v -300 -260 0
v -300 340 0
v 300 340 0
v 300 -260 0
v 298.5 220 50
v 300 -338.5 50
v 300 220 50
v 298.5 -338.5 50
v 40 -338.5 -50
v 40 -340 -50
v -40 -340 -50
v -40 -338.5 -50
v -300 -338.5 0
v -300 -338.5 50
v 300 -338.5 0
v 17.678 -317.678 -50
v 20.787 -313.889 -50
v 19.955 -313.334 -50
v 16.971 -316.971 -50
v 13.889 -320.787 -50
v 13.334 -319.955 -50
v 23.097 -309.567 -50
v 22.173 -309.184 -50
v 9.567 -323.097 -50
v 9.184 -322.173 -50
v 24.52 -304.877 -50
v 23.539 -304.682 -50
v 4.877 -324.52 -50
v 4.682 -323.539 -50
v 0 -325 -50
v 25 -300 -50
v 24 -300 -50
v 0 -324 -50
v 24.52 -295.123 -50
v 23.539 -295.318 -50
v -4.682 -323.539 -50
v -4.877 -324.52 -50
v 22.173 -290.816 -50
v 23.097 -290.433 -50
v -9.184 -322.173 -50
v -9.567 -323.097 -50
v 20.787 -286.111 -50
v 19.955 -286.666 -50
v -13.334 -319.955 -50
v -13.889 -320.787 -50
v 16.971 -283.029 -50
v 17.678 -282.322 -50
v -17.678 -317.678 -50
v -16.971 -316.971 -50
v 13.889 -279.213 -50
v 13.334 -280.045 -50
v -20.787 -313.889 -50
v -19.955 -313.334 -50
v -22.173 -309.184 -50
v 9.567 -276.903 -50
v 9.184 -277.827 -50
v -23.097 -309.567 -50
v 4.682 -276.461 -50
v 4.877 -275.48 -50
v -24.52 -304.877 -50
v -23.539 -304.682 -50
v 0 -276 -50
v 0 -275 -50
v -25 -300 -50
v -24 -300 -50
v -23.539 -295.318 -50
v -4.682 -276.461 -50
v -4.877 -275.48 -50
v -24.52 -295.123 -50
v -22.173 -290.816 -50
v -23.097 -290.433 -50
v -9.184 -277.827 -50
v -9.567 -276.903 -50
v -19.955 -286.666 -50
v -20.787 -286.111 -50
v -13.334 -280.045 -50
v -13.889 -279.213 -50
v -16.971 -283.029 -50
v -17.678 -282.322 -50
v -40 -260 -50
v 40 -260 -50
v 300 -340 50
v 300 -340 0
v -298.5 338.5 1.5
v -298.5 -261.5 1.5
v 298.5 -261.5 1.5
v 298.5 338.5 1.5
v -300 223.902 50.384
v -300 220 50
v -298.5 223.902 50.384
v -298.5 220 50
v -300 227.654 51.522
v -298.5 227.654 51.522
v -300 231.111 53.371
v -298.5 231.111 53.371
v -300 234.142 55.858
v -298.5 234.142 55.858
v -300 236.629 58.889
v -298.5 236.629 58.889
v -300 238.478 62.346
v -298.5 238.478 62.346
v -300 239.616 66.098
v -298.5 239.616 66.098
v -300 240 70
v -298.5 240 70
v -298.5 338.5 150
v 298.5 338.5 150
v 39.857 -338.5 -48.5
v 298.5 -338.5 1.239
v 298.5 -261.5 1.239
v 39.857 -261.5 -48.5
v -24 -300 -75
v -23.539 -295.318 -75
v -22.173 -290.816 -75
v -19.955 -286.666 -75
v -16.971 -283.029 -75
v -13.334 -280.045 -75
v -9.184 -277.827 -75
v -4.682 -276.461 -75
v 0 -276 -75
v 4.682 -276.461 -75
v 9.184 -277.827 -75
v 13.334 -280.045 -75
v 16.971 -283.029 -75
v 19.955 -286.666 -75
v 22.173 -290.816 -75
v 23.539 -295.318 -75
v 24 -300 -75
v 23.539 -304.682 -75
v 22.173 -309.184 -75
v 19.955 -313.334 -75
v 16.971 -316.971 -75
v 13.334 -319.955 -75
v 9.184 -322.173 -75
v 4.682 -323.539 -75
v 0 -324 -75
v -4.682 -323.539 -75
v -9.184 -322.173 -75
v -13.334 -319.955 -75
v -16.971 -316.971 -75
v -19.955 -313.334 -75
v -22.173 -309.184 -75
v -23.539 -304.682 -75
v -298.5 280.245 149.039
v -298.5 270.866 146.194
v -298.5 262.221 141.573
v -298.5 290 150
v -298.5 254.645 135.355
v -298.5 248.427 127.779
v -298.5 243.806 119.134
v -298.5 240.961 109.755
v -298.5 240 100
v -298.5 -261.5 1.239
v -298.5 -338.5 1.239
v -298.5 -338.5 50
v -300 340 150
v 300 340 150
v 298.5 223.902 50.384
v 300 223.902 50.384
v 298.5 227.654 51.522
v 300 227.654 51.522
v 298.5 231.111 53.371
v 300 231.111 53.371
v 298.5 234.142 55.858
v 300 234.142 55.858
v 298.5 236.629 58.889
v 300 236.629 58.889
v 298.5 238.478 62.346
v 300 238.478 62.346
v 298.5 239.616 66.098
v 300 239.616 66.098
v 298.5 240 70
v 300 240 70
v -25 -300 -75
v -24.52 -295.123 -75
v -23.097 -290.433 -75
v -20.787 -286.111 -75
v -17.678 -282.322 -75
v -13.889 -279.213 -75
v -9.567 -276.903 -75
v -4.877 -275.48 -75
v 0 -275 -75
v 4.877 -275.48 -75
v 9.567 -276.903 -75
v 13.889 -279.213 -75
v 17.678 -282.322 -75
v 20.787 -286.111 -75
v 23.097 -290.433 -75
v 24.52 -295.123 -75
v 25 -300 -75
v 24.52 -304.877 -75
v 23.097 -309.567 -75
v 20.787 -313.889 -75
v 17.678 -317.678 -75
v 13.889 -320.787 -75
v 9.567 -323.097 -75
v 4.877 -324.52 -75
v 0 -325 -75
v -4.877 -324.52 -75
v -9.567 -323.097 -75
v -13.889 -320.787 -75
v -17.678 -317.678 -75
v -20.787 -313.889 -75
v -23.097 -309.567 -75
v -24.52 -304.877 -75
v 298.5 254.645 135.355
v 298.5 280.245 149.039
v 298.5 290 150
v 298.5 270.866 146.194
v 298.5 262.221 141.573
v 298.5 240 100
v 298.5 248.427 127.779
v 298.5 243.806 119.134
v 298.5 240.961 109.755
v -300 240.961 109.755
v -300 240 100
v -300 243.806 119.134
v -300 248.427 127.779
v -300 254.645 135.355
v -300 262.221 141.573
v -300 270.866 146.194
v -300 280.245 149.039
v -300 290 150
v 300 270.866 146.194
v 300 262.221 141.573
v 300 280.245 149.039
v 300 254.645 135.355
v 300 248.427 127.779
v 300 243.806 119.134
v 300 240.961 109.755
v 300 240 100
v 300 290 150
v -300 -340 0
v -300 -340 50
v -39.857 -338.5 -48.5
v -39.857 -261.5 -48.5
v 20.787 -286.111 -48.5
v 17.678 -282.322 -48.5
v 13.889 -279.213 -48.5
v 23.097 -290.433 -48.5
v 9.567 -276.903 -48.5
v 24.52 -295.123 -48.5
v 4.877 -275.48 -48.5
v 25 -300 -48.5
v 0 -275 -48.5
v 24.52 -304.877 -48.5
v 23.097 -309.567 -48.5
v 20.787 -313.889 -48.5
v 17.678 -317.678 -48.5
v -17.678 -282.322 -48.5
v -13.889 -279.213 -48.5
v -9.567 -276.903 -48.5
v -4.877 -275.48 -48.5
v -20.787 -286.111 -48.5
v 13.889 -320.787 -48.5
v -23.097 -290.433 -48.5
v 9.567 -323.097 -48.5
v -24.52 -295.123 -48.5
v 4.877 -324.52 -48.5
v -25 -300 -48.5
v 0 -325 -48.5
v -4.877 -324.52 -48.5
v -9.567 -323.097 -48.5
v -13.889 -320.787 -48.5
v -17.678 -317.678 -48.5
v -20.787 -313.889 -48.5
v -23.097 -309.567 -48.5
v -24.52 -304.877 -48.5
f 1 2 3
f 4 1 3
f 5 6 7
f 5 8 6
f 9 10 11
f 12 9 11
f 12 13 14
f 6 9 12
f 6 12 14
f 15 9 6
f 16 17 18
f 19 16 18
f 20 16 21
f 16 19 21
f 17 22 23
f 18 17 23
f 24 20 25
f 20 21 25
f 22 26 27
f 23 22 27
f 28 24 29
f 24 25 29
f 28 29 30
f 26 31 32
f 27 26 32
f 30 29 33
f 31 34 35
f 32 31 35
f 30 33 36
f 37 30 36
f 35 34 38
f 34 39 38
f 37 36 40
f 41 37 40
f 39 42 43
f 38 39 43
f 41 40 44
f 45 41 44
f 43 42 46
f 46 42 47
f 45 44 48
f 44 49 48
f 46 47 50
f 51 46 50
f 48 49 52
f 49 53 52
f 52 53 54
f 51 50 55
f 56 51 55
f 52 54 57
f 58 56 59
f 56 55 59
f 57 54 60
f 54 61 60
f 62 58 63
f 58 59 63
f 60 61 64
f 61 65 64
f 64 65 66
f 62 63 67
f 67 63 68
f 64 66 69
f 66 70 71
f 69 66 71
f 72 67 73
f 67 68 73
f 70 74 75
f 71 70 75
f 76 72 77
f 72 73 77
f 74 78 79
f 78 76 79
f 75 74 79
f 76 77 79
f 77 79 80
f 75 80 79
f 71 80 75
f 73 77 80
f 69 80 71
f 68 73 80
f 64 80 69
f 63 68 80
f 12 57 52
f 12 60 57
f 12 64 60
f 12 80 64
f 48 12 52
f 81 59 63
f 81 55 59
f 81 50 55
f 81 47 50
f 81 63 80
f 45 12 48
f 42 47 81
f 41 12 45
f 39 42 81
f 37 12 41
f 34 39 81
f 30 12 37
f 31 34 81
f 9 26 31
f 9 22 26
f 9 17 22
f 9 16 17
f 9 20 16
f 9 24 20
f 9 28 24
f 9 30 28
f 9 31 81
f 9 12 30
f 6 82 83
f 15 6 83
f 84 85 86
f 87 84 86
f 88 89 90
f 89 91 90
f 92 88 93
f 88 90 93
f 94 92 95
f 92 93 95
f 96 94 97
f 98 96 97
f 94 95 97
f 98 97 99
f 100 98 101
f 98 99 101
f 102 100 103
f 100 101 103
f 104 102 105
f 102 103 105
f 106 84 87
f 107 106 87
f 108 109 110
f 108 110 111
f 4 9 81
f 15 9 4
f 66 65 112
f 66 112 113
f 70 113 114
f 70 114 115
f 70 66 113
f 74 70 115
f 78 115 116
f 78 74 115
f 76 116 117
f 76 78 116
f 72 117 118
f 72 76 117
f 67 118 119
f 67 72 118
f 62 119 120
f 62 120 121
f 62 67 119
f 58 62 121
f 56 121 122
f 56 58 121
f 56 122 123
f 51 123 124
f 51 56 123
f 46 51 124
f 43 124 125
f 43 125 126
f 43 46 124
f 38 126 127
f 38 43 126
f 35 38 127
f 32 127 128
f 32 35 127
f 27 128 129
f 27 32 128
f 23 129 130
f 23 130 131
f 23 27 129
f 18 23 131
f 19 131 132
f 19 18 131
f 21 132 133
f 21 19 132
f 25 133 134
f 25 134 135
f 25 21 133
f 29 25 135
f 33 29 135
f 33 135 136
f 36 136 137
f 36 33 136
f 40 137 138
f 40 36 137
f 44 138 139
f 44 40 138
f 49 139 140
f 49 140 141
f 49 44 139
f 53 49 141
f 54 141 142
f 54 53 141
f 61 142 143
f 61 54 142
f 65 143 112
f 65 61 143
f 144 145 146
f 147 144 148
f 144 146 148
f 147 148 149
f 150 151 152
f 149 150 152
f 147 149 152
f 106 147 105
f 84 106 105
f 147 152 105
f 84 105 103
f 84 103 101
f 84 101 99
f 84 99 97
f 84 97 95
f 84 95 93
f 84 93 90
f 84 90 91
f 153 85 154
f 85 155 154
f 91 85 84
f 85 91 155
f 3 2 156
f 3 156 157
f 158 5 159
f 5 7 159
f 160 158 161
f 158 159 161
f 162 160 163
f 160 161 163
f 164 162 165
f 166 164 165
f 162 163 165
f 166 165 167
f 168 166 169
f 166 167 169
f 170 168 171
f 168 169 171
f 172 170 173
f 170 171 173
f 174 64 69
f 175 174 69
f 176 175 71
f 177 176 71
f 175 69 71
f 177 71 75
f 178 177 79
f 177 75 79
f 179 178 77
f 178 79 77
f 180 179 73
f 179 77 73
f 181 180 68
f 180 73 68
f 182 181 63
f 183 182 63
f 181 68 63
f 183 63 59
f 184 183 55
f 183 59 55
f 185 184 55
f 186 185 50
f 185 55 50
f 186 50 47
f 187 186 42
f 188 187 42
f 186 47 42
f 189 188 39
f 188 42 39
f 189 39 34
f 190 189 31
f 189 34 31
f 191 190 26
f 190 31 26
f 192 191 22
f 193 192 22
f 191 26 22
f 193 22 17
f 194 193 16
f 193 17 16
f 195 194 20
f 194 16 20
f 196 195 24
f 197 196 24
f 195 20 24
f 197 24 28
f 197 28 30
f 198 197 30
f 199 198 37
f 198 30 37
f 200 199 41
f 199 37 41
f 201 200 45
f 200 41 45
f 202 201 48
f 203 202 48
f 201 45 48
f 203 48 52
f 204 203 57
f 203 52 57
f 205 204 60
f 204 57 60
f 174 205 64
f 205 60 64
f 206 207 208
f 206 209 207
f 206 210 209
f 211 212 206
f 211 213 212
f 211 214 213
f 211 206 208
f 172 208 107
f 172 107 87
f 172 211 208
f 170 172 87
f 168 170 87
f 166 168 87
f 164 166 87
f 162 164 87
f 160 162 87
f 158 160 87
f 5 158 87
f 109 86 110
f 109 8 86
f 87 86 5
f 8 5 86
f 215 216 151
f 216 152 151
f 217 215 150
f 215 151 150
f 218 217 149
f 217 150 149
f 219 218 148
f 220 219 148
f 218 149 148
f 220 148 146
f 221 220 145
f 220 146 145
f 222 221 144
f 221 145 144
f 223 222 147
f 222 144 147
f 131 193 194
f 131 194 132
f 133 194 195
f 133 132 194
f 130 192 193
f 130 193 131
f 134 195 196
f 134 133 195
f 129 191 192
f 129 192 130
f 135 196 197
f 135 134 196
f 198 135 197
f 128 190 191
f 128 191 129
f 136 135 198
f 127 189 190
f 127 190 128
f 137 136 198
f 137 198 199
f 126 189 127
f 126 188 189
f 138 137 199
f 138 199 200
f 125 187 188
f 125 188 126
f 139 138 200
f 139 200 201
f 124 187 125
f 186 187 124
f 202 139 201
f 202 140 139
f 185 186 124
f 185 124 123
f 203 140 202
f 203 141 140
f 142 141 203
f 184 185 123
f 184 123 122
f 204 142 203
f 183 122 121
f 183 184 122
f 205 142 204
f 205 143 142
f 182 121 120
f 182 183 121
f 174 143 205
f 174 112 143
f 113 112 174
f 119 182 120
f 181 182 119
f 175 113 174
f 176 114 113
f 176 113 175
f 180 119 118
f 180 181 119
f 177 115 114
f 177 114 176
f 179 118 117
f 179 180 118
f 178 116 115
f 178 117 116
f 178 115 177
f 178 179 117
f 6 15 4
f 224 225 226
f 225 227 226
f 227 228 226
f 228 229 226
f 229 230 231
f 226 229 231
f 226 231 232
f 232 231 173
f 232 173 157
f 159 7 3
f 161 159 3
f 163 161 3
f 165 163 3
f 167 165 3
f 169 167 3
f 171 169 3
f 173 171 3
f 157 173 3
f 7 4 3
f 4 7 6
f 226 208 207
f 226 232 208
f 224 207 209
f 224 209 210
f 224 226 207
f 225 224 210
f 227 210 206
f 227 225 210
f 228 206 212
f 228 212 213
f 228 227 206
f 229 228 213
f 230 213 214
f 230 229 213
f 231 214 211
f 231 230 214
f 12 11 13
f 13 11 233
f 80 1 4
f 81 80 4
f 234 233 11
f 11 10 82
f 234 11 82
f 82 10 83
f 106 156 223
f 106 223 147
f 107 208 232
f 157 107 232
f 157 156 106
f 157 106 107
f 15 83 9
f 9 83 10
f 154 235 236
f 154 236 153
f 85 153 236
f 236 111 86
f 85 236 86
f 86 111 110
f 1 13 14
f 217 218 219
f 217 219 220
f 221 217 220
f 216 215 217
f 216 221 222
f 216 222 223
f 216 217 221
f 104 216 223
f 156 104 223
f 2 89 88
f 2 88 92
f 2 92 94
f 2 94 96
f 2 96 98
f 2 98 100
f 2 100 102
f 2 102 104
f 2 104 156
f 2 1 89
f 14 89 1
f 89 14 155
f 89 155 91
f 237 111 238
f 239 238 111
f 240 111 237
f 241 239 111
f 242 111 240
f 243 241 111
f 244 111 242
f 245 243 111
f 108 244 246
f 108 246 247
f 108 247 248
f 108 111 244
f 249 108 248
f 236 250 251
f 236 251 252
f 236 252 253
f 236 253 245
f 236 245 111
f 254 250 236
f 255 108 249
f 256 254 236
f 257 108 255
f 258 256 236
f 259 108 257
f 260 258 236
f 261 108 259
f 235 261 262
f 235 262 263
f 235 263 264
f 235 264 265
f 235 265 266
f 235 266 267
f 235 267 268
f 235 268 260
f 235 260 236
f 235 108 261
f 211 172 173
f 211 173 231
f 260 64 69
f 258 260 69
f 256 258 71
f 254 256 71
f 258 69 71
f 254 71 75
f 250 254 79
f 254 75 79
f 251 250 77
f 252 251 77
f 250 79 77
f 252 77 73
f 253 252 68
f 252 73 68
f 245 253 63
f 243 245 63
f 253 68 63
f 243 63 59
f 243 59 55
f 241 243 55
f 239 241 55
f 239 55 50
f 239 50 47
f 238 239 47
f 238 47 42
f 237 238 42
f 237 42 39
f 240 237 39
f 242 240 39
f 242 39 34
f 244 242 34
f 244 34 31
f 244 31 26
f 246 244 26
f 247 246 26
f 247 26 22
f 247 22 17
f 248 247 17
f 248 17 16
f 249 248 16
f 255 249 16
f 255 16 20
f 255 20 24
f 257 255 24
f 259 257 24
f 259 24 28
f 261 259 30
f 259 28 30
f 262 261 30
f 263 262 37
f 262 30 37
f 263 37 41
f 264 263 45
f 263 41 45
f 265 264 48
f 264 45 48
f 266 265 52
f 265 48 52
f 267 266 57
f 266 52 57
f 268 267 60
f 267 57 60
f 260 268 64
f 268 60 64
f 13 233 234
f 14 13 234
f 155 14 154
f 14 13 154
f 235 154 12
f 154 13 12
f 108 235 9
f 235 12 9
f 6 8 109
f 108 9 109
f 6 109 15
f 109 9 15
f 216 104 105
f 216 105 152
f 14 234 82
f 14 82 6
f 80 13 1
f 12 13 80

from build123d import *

# Parameters (mm, degrees)
SKETCH_6_W                 = 600
SKETCH_6_H                 = 680
EXTRUDE_2_DEPTH            = 150
EXTRUDE_4_DEPTH            = 80
SHELL_START                = -338.5
SHELL_2_OUTLINE_W          = 597
SHELL_2_OUTLINE_H          = 148.5
SHELL_2_DEPTH              = 677
SHELL_2_2_DEPTH            = 77
SKETCH_13_R                = 25
CUT_EXTRUDE_1_DEPTH        = 496.580467735
SPLIT_START                = -340
SPLIT_BODIES_5_DEPTH       = 1.5
SPLIT_BODIES_5_2_OUTLINE_W = 602
SPLIT_BODIES_5_2_OUTLINE_H = 203
SPLIT_BODIES_5_2_DEPTH     = 1.5
SKETCH_15_W                = 200.791070075
SKETCH_15_H                = 666.3886285
CUT_EXTRUDE_2_DEPTH        = 706.761999544
FILLET_1_R                 = 20
FILLET_2_R                 = 50
SKETCH_16_R                = 25
SKETCH_16_R_2              = 24
EXTRUDE_5_DEPTH            = 25


# Read off the part's stored shape, not the designer's step: 抽壳2, 分割5
with BuildPart() as part:
    # 草图6 → 凸台-拉伸2 (new body)
    with BuildSketch(Plane.XY):
        Rectangle(SKETCH_6_W, SKETCH_6_H)
    extrude(amount=EXTRUDE_2_DEPTH)

    # 草图8 → 凸台-拉伸4 (add)
    with BuildSketch(Plane.XZ.offset(340)):
        Polygon((-300, 0), (-40, -50), (40, -50), (300, 0), align=None)
    extrude(amount=-EXTRUDE_4_DEPTH)

    # 抽壳2 outline → 抽壳2 (cut)
    with BuildSketch(Plane(origin=(0, 0, 0), x_dir=(1, 0, 0), z_dir=(0, 1, 0)).offset(SHELL_START)):
        with Locations((0, -75.75)):
            Rectangle(SHELL_2_OUTLINE_W, SHELL_2_OUTLINE_H)
    extrude(amount=SHELL_2_DEPTH, mode=Mode.SUBTRACT)

    # Shell 2 2 outline → Shell 2 2 (cut)
    with BuildSketch(Plane(origin=(0, 0, 0), x_dir=(1, 0, 0), z_dir=(0, 1, 0)).offset(SHELL_START)):
        Polygon((-298.5, -1.5), (298.5, -1.5), (298.5, -1.239023342), (39.857078623, 48.5), (-39.857078623, 48.5), (-298.5, -1.239023342), align=None)
    extrude(amount=SHELL_2_2_DEPTH, mode=Mode.SUBTRACT)

    # 草图13 → 切除-拉伸1 (cut, through all)
    with BuildSketch(Plane(origin=(0, 0, -50), x_dir=(-1, 0, 0), z_dir=(0, 0, -1))):
        with Locations((0, -300)):
            Circle(SKETCH_13_R)
    extrude(amount=-CUT_EXTRUDE_1_DEPTH, mode=Mode.SUBTRACT)

    # Split Bodies 5 2 outline → Split Bodies 5 2 (cut)
    with BuildSketch(Plane(origin=(0, 0, 0), x_dir=(1, 0, 0), z_dir=(0, 1, 0)).offset(SPLIT_START)):
        with Locations((0, -49.5)):
            Rectangle(SPLIT_BODIES_5_2_OUTLINE_W, SPLIT_BODIES_5_2_OUTLINE_H)
    extrude(amount=SPLIT_BODIES_5_2_DEPTH, mode=Mode.SUBTRACT)


with BuildPart() as body_2:
    # Split Bodies 5 outline → Split Bodies 5 (new body)
    with BuildSketch(Plane(origin=(0, 0, 0), x_dir=(1, 0, 0), z_dir=(0, 1, 0)).offset(SPLIT_START)):
        Polygon((-300, -150), (300, -150), (300, 0), (40, 50), (-40, 50), (-300, 0), align=None)
    extrude(amount=SPLIT_BODIES_5_DEPTH)


with BuildPart() as cut_extrude_2_tool:
    # 草图15 → 切除-拉伸2 (new, through all)
    with BuildSketch(Plane.ZY.offset(300)):
        with Locations((150.395535037, -93.19431425)):
            Rectangle(SKETCH_15_W, SKETCH_15_H)
    extrude(amount=-CUT_EXTRUDE_2_DEPTH)


with BuildPart() as part_1:
    add(part.part)

    # 切除-拉伸2: cut by cut_extrude_2_tool
    add(cut_extrude_2_tool.part, mode=Mode.SUBTRACT)

    # 圆角1
    fillet_1_edges = [part_1.edges().sort_by_distance(p)[0] for p in [
        (-299.25, 240, 50),
        (299.25, 240, 50),
    ]]
    fillet(fillet_1_edges, radius=FILLET_1_R)

    # 圆角2
    fillet_2_edges = [part_1.edges().sort_by_distance(p)[0] for p in [
        (-299.25, 240, 150),
        (299.25, 240, 150),
    ]]
    fillet(fillet_2_edges, radius=FILLET_2_R)


with BuildPart() as body_2_1:
    add(body_2.part)

    # 切除-拉伸2: cut by cut_extrude_2_tool
    add(cut_extrude_2_tool.part, mode=Mode.SUBTRACT)


with BuildPart() as body_3:
    # 草图16 → 凸台-拉伸5 (new body)
    with BuildSketch(Plane(origin=(0, 0, -50), x_dir=(-1, 0, 0), z_dir=(0, 0, -1))):
        with Locations((0, -300)):
            Circle(SKETCH_16_R)
        with Locations((0, -300)):
            Circle(SKETCH_16_R_2, mode=Mode.SUBTRACT)
    extrude(amount=EXTRUDE_5_DEPTH)


solid = Compound([part_1.part, body_2_1.part, body_3.part])
